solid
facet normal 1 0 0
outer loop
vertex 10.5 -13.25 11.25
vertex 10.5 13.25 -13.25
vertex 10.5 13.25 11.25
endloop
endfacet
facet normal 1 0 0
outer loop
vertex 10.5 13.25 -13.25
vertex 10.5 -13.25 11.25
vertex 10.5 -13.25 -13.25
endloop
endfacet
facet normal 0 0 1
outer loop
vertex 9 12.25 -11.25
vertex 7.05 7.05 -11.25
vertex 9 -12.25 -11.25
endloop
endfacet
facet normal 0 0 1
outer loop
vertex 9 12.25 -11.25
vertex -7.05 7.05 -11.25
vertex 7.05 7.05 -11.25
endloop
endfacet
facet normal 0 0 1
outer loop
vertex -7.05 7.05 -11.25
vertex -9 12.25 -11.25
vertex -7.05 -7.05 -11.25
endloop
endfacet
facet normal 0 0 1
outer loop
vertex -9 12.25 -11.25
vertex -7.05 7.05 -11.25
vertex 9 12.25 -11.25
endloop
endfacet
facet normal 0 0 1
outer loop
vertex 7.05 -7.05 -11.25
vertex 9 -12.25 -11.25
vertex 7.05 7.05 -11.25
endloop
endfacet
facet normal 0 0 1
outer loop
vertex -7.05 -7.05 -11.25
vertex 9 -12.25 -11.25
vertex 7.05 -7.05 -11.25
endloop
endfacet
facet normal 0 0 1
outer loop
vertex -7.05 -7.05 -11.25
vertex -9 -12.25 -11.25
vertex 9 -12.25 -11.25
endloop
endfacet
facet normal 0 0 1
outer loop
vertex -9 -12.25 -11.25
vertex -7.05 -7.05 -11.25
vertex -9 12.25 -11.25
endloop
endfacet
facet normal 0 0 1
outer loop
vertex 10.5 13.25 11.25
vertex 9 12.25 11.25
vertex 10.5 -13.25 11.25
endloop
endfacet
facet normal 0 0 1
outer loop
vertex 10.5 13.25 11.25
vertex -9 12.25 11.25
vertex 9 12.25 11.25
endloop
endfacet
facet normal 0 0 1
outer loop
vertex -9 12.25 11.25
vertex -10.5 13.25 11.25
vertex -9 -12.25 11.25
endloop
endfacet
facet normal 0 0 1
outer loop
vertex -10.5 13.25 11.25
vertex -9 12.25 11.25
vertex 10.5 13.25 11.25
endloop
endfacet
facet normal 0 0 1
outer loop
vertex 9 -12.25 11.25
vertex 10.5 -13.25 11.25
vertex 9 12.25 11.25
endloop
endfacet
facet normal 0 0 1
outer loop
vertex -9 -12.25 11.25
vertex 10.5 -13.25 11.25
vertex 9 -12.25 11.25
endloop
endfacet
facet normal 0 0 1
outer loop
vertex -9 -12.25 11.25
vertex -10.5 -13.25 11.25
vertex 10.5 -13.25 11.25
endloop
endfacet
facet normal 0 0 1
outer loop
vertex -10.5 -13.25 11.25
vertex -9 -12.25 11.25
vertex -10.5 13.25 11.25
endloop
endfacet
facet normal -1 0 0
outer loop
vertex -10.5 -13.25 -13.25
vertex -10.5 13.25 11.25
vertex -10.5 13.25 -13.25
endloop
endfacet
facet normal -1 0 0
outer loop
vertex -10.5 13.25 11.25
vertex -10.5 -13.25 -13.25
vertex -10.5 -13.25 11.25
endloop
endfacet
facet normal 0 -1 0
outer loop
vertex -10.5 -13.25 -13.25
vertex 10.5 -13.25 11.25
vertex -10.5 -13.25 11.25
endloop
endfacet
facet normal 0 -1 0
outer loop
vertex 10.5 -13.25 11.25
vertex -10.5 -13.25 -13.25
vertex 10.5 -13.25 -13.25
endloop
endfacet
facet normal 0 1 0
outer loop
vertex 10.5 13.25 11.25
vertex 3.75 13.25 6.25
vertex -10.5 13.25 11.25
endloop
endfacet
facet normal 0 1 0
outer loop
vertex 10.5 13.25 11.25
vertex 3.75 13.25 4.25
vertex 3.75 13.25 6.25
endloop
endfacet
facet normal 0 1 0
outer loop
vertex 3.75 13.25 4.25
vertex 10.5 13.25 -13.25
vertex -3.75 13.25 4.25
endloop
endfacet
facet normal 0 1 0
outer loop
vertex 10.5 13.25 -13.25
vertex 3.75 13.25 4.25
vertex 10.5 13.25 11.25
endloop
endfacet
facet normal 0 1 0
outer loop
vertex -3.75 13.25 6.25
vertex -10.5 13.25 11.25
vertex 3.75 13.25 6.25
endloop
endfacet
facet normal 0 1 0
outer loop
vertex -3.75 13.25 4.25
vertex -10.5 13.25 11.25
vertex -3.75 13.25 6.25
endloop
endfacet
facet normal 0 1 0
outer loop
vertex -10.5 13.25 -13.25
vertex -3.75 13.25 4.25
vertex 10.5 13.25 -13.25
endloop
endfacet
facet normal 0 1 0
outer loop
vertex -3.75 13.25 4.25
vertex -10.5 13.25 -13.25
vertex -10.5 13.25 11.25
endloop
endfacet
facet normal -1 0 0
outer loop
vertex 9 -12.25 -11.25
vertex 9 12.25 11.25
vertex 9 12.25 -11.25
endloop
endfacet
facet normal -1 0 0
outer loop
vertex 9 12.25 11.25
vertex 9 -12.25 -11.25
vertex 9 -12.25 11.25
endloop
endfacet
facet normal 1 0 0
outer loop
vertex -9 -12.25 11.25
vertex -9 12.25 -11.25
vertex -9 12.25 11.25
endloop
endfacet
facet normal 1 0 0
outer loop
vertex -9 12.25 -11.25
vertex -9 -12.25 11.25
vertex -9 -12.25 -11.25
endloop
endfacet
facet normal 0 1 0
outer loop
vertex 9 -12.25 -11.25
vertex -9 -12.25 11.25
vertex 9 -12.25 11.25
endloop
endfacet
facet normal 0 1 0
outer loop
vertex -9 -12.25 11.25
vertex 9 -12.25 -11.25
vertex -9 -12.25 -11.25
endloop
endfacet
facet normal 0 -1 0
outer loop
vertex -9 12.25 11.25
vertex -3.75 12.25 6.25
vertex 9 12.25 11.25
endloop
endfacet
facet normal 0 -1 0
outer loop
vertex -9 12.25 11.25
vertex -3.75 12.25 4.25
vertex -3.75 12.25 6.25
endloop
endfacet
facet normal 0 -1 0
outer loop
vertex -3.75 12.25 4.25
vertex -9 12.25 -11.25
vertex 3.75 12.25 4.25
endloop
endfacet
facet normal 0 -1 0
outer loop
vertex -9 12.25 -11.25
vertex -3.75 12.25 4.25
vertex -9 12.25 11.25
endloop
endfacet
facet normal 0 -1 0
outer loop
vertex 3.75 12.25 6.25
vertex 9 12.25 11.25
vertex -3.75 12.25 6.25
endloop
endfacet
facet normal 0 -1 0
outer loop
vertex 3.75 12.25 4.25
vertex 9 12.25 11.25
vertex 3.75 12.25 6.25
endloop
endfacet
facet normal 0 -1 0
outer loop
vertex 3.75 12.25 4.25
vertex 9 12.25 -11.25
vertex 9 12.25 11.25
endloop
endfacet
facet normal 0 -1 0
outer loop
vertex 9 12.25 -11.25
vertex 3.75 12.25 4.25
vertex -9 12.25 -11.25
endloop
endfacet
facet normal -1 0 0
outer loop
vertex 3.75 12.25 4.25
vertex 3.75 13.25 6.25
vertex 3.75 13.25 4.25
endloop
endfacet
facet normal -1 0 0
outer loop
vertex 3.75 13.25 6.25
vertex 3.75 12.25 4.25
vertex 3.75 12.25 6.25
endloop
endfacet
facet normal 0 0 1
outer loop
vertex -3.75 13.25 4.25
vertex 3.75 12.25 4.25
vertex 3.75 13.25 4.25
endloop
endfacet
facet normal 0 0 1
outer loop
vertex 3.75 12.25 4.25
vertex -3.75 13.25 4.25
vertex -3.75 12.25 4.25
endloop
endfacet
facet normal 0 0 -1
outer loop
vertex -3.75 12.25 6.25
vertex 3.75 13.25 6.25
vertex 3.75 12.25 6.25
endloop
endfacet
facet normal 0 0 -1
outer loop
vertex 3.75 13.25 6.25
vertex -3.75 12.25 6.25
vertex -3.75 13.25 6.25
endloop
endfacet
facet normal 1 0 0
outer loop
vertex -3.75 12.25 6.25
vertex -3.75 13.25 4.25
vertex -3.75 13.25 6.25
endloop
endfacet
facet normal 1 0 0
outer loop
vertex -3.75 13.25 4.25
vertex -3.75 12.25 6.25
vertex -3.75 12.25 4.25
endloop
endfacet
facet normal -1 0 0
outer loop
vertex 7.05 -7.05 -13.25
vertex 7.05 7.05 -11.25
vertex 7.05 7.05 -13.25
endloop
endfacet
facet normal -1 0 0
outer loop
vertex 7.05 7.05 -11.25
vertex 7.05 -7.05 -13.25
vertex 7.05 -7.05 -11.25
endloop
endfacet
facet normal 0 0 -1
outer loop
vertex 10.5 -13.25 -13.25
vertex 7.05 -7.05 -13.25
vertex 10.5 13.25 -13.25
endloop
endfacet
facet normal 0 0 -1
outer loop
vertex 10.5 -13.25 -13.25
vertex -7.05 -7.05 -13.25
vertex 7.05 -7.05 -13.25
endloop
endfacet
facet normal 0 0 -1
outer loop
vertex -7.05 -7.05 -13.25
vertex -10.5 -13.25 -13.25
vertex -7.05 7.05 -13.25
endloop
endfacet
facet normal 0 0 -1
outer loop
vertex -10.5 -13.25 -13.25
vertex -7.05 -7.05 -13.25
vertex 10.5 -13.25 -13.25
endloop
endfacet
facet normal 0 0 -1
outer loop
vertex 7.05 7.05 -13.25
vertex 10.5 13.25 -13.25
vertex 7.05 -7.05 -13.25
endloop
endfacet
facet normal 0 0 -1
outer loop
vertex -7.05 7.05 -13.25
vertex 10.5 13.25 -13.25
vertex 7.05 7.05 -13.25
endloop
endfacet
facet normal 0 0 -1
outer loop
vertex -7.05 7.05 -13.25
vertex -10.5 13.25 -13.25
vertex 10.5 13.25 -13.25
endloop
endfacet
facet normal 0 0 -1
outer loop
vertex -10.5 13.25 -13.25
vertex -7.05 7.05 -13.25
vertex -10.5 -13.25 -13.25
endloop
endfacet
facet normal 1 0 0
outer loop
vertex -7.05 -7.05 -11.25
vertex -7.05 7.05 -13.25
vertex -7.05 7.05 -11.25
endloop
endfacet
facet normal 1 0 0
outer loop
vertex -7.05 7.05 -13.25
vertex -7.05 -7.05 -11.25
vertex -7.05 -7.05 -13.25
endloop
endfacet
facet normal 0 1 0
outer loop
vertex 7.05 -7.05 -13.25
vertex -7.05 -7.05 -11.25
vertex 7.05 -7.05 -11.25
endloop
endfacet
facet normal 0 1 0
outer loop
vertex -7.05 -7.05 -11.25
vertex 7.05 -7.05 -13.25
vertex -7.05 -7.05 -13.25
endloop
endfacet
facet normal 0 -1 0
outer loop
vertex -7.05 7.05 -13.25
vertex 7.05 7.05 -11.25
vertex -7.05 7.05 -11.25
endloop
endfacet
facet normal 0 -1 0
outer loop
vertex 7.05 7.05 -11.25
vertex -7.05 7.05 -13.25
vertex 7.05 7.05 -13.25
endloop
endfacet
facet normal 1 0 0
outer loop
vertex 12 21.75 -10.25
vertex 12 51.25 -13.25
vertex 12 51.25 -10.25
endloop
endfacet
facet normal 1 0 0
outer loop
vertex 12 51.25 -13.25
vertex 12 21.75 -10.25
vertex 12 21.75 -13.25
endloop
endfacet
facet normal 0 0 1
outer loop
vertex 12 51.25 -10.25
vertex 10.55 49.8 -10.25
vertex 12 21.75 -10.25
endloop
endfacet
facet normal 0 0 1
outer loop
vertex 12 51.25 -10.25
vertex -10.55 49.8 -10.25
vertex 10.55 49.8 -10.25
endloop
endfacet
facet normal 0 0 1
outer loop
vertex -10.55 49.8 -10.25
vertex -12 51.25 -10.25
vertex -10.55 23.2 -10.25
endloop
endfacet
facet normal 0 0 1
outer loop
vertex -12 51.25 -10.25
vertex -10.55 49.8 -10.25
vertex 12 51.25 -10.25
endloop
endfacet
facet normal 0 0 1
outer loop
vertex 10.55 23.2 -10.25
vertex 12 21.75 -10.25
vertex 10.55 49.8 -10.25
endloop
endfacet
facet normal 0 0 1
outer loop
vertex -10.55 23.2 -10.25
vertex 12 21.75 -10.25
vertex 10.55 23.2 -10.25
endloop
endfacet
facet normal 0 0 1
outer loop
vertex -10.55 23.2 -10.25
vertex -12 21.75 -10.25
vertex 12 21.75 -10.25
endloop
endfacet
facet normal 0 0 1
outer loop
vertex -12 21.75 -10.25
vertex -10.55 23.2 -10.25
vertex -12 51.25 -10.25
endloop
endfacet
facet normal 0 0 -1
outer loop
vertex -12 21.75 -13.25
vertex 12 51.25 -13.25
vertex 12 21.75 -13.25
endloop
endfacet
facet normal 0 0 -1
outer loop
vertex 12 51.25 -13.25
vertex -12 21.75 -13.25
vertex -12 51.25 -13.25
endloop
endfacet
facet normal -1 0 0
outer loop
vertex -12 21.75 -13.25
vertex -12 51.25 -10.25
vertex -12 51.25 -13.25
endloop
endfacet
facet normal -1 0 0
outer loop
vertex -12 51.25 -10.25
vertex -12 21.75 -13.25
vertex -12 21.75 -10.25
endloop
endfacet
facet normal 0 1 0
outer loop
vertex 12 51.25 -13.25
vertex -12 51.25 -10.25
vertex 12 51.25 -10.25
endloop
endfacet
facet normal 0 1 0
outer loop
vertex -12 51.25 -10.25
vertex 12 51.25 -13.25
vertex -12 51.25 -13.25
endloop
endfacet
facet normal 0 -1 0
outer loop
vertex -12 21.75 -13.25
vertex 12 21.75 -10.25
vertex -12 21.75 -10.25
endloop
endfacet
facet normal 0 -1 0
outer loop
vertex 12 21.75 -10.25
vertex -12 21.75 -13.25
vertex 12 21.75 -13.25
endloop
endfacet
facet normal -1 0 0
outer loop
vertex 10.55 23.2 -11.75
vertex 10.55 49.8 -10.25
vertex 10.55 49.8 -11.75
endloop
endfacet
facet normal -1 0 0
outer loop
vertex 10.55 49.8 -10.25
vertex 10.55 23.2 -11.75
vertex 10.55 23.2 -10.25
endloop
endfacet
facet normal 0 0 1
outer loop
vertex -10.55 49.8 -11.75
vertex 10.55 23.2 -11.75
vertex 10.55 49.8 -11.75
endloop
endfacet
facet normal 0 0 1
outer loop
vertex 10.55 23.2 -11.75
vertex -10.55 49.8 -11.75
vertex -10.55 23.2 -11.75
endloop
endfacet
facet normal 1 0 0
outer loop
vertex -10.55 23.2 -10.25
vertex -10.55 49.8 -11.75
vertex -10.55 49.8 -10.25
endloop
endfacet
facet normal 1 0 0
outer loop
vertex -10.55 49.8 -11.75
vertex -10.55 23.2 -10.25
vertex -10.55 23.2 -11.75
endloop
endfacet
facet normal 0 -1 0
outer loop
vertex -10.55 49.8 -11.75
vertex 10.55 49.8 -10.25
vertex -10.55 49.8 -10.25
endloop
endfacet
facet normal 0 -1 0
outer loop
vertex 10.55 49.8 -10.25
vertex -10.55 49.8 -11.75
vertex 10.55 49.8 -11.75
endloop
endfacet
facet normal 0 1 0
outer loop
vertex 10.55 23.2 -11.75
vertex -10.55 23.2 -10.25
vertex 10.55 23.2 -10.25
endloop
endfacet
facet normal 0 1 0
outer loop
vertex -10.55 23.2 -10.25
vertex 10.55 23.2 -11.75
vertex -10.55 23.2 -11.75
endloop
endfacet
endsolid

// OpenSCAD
switch_width = 14.1; // .1 for clearance

// outer cube itself
// total height of cube. be sure to factor in some play for the wires!
height = 22.5;
// total depth, or y value, of the cube
depth = 26.5;
// total width, or x value, of the cube
width = 21;
// thickness of longer walls on the cube
long_wall_thickness = 3;
// thickness of shorter walls on the cube
short_wall_thickness = 2;

// micro usb hole
// usb hole width
usb_width = 7.5;
// usb hole depth
usb_depth = depth;
// usb hole height
usb_height = 2;
// height from the bottom that the middle of the usb hole should be at
usb_height_offset = 6;

//top
//thickness of top plate that holds in the switch
top_thickness = 2;

//bottom
//bottom lip width
bottom_padding_width = 3;
// bottom lip depth
bottom_padding_depth = 3;
// bottom lip height. works a bit wonky right now; best to leave it at 1
bottom_padding_height = 1;

//amount of iterations to do for the switch holes. even numbers please! 4 = 2 on each side of the original
switch_hole_iterations = 4;

rotate([180,0,0]){
    difference(){
        cube([width,depth,height], center=true); // outside cube
        cube([width-long_wall_thickness,depth-short_wall_thickness,height], center = true); // inside cube
        
        translate([0,-depth/2,-height/2 + usb_height_offset])
        cube([usb_width,usb_depth,usb_height], center = true); // micro usb hole
    }
    
    // top
    translate([0,0,(height + top_thickness)/2])
    difference(){
        cube([width,depth,top_thickness], center = true);
        for (x = [0:switch_hole_iterations]){
            translate([19 * (x-switch_hole_iterations/2), 0, 0]) 
            cube([switch_width,switch_width,top_thickness], center = true);// switch hole
        }
    }
}

translate([0,depth + 10,-height/2 + (top_thickness + bottom_padding_height)/2 - top_thickness])
difference(){
    cube([width + bottom_padding_width,depth + bottom_padding_depth,top_thickness + bottom_padding_height], center = true);
    translate([0,0,bottom_padding_height]) cube([width+.1,depth+.1,top_thickness], center = true);
}
